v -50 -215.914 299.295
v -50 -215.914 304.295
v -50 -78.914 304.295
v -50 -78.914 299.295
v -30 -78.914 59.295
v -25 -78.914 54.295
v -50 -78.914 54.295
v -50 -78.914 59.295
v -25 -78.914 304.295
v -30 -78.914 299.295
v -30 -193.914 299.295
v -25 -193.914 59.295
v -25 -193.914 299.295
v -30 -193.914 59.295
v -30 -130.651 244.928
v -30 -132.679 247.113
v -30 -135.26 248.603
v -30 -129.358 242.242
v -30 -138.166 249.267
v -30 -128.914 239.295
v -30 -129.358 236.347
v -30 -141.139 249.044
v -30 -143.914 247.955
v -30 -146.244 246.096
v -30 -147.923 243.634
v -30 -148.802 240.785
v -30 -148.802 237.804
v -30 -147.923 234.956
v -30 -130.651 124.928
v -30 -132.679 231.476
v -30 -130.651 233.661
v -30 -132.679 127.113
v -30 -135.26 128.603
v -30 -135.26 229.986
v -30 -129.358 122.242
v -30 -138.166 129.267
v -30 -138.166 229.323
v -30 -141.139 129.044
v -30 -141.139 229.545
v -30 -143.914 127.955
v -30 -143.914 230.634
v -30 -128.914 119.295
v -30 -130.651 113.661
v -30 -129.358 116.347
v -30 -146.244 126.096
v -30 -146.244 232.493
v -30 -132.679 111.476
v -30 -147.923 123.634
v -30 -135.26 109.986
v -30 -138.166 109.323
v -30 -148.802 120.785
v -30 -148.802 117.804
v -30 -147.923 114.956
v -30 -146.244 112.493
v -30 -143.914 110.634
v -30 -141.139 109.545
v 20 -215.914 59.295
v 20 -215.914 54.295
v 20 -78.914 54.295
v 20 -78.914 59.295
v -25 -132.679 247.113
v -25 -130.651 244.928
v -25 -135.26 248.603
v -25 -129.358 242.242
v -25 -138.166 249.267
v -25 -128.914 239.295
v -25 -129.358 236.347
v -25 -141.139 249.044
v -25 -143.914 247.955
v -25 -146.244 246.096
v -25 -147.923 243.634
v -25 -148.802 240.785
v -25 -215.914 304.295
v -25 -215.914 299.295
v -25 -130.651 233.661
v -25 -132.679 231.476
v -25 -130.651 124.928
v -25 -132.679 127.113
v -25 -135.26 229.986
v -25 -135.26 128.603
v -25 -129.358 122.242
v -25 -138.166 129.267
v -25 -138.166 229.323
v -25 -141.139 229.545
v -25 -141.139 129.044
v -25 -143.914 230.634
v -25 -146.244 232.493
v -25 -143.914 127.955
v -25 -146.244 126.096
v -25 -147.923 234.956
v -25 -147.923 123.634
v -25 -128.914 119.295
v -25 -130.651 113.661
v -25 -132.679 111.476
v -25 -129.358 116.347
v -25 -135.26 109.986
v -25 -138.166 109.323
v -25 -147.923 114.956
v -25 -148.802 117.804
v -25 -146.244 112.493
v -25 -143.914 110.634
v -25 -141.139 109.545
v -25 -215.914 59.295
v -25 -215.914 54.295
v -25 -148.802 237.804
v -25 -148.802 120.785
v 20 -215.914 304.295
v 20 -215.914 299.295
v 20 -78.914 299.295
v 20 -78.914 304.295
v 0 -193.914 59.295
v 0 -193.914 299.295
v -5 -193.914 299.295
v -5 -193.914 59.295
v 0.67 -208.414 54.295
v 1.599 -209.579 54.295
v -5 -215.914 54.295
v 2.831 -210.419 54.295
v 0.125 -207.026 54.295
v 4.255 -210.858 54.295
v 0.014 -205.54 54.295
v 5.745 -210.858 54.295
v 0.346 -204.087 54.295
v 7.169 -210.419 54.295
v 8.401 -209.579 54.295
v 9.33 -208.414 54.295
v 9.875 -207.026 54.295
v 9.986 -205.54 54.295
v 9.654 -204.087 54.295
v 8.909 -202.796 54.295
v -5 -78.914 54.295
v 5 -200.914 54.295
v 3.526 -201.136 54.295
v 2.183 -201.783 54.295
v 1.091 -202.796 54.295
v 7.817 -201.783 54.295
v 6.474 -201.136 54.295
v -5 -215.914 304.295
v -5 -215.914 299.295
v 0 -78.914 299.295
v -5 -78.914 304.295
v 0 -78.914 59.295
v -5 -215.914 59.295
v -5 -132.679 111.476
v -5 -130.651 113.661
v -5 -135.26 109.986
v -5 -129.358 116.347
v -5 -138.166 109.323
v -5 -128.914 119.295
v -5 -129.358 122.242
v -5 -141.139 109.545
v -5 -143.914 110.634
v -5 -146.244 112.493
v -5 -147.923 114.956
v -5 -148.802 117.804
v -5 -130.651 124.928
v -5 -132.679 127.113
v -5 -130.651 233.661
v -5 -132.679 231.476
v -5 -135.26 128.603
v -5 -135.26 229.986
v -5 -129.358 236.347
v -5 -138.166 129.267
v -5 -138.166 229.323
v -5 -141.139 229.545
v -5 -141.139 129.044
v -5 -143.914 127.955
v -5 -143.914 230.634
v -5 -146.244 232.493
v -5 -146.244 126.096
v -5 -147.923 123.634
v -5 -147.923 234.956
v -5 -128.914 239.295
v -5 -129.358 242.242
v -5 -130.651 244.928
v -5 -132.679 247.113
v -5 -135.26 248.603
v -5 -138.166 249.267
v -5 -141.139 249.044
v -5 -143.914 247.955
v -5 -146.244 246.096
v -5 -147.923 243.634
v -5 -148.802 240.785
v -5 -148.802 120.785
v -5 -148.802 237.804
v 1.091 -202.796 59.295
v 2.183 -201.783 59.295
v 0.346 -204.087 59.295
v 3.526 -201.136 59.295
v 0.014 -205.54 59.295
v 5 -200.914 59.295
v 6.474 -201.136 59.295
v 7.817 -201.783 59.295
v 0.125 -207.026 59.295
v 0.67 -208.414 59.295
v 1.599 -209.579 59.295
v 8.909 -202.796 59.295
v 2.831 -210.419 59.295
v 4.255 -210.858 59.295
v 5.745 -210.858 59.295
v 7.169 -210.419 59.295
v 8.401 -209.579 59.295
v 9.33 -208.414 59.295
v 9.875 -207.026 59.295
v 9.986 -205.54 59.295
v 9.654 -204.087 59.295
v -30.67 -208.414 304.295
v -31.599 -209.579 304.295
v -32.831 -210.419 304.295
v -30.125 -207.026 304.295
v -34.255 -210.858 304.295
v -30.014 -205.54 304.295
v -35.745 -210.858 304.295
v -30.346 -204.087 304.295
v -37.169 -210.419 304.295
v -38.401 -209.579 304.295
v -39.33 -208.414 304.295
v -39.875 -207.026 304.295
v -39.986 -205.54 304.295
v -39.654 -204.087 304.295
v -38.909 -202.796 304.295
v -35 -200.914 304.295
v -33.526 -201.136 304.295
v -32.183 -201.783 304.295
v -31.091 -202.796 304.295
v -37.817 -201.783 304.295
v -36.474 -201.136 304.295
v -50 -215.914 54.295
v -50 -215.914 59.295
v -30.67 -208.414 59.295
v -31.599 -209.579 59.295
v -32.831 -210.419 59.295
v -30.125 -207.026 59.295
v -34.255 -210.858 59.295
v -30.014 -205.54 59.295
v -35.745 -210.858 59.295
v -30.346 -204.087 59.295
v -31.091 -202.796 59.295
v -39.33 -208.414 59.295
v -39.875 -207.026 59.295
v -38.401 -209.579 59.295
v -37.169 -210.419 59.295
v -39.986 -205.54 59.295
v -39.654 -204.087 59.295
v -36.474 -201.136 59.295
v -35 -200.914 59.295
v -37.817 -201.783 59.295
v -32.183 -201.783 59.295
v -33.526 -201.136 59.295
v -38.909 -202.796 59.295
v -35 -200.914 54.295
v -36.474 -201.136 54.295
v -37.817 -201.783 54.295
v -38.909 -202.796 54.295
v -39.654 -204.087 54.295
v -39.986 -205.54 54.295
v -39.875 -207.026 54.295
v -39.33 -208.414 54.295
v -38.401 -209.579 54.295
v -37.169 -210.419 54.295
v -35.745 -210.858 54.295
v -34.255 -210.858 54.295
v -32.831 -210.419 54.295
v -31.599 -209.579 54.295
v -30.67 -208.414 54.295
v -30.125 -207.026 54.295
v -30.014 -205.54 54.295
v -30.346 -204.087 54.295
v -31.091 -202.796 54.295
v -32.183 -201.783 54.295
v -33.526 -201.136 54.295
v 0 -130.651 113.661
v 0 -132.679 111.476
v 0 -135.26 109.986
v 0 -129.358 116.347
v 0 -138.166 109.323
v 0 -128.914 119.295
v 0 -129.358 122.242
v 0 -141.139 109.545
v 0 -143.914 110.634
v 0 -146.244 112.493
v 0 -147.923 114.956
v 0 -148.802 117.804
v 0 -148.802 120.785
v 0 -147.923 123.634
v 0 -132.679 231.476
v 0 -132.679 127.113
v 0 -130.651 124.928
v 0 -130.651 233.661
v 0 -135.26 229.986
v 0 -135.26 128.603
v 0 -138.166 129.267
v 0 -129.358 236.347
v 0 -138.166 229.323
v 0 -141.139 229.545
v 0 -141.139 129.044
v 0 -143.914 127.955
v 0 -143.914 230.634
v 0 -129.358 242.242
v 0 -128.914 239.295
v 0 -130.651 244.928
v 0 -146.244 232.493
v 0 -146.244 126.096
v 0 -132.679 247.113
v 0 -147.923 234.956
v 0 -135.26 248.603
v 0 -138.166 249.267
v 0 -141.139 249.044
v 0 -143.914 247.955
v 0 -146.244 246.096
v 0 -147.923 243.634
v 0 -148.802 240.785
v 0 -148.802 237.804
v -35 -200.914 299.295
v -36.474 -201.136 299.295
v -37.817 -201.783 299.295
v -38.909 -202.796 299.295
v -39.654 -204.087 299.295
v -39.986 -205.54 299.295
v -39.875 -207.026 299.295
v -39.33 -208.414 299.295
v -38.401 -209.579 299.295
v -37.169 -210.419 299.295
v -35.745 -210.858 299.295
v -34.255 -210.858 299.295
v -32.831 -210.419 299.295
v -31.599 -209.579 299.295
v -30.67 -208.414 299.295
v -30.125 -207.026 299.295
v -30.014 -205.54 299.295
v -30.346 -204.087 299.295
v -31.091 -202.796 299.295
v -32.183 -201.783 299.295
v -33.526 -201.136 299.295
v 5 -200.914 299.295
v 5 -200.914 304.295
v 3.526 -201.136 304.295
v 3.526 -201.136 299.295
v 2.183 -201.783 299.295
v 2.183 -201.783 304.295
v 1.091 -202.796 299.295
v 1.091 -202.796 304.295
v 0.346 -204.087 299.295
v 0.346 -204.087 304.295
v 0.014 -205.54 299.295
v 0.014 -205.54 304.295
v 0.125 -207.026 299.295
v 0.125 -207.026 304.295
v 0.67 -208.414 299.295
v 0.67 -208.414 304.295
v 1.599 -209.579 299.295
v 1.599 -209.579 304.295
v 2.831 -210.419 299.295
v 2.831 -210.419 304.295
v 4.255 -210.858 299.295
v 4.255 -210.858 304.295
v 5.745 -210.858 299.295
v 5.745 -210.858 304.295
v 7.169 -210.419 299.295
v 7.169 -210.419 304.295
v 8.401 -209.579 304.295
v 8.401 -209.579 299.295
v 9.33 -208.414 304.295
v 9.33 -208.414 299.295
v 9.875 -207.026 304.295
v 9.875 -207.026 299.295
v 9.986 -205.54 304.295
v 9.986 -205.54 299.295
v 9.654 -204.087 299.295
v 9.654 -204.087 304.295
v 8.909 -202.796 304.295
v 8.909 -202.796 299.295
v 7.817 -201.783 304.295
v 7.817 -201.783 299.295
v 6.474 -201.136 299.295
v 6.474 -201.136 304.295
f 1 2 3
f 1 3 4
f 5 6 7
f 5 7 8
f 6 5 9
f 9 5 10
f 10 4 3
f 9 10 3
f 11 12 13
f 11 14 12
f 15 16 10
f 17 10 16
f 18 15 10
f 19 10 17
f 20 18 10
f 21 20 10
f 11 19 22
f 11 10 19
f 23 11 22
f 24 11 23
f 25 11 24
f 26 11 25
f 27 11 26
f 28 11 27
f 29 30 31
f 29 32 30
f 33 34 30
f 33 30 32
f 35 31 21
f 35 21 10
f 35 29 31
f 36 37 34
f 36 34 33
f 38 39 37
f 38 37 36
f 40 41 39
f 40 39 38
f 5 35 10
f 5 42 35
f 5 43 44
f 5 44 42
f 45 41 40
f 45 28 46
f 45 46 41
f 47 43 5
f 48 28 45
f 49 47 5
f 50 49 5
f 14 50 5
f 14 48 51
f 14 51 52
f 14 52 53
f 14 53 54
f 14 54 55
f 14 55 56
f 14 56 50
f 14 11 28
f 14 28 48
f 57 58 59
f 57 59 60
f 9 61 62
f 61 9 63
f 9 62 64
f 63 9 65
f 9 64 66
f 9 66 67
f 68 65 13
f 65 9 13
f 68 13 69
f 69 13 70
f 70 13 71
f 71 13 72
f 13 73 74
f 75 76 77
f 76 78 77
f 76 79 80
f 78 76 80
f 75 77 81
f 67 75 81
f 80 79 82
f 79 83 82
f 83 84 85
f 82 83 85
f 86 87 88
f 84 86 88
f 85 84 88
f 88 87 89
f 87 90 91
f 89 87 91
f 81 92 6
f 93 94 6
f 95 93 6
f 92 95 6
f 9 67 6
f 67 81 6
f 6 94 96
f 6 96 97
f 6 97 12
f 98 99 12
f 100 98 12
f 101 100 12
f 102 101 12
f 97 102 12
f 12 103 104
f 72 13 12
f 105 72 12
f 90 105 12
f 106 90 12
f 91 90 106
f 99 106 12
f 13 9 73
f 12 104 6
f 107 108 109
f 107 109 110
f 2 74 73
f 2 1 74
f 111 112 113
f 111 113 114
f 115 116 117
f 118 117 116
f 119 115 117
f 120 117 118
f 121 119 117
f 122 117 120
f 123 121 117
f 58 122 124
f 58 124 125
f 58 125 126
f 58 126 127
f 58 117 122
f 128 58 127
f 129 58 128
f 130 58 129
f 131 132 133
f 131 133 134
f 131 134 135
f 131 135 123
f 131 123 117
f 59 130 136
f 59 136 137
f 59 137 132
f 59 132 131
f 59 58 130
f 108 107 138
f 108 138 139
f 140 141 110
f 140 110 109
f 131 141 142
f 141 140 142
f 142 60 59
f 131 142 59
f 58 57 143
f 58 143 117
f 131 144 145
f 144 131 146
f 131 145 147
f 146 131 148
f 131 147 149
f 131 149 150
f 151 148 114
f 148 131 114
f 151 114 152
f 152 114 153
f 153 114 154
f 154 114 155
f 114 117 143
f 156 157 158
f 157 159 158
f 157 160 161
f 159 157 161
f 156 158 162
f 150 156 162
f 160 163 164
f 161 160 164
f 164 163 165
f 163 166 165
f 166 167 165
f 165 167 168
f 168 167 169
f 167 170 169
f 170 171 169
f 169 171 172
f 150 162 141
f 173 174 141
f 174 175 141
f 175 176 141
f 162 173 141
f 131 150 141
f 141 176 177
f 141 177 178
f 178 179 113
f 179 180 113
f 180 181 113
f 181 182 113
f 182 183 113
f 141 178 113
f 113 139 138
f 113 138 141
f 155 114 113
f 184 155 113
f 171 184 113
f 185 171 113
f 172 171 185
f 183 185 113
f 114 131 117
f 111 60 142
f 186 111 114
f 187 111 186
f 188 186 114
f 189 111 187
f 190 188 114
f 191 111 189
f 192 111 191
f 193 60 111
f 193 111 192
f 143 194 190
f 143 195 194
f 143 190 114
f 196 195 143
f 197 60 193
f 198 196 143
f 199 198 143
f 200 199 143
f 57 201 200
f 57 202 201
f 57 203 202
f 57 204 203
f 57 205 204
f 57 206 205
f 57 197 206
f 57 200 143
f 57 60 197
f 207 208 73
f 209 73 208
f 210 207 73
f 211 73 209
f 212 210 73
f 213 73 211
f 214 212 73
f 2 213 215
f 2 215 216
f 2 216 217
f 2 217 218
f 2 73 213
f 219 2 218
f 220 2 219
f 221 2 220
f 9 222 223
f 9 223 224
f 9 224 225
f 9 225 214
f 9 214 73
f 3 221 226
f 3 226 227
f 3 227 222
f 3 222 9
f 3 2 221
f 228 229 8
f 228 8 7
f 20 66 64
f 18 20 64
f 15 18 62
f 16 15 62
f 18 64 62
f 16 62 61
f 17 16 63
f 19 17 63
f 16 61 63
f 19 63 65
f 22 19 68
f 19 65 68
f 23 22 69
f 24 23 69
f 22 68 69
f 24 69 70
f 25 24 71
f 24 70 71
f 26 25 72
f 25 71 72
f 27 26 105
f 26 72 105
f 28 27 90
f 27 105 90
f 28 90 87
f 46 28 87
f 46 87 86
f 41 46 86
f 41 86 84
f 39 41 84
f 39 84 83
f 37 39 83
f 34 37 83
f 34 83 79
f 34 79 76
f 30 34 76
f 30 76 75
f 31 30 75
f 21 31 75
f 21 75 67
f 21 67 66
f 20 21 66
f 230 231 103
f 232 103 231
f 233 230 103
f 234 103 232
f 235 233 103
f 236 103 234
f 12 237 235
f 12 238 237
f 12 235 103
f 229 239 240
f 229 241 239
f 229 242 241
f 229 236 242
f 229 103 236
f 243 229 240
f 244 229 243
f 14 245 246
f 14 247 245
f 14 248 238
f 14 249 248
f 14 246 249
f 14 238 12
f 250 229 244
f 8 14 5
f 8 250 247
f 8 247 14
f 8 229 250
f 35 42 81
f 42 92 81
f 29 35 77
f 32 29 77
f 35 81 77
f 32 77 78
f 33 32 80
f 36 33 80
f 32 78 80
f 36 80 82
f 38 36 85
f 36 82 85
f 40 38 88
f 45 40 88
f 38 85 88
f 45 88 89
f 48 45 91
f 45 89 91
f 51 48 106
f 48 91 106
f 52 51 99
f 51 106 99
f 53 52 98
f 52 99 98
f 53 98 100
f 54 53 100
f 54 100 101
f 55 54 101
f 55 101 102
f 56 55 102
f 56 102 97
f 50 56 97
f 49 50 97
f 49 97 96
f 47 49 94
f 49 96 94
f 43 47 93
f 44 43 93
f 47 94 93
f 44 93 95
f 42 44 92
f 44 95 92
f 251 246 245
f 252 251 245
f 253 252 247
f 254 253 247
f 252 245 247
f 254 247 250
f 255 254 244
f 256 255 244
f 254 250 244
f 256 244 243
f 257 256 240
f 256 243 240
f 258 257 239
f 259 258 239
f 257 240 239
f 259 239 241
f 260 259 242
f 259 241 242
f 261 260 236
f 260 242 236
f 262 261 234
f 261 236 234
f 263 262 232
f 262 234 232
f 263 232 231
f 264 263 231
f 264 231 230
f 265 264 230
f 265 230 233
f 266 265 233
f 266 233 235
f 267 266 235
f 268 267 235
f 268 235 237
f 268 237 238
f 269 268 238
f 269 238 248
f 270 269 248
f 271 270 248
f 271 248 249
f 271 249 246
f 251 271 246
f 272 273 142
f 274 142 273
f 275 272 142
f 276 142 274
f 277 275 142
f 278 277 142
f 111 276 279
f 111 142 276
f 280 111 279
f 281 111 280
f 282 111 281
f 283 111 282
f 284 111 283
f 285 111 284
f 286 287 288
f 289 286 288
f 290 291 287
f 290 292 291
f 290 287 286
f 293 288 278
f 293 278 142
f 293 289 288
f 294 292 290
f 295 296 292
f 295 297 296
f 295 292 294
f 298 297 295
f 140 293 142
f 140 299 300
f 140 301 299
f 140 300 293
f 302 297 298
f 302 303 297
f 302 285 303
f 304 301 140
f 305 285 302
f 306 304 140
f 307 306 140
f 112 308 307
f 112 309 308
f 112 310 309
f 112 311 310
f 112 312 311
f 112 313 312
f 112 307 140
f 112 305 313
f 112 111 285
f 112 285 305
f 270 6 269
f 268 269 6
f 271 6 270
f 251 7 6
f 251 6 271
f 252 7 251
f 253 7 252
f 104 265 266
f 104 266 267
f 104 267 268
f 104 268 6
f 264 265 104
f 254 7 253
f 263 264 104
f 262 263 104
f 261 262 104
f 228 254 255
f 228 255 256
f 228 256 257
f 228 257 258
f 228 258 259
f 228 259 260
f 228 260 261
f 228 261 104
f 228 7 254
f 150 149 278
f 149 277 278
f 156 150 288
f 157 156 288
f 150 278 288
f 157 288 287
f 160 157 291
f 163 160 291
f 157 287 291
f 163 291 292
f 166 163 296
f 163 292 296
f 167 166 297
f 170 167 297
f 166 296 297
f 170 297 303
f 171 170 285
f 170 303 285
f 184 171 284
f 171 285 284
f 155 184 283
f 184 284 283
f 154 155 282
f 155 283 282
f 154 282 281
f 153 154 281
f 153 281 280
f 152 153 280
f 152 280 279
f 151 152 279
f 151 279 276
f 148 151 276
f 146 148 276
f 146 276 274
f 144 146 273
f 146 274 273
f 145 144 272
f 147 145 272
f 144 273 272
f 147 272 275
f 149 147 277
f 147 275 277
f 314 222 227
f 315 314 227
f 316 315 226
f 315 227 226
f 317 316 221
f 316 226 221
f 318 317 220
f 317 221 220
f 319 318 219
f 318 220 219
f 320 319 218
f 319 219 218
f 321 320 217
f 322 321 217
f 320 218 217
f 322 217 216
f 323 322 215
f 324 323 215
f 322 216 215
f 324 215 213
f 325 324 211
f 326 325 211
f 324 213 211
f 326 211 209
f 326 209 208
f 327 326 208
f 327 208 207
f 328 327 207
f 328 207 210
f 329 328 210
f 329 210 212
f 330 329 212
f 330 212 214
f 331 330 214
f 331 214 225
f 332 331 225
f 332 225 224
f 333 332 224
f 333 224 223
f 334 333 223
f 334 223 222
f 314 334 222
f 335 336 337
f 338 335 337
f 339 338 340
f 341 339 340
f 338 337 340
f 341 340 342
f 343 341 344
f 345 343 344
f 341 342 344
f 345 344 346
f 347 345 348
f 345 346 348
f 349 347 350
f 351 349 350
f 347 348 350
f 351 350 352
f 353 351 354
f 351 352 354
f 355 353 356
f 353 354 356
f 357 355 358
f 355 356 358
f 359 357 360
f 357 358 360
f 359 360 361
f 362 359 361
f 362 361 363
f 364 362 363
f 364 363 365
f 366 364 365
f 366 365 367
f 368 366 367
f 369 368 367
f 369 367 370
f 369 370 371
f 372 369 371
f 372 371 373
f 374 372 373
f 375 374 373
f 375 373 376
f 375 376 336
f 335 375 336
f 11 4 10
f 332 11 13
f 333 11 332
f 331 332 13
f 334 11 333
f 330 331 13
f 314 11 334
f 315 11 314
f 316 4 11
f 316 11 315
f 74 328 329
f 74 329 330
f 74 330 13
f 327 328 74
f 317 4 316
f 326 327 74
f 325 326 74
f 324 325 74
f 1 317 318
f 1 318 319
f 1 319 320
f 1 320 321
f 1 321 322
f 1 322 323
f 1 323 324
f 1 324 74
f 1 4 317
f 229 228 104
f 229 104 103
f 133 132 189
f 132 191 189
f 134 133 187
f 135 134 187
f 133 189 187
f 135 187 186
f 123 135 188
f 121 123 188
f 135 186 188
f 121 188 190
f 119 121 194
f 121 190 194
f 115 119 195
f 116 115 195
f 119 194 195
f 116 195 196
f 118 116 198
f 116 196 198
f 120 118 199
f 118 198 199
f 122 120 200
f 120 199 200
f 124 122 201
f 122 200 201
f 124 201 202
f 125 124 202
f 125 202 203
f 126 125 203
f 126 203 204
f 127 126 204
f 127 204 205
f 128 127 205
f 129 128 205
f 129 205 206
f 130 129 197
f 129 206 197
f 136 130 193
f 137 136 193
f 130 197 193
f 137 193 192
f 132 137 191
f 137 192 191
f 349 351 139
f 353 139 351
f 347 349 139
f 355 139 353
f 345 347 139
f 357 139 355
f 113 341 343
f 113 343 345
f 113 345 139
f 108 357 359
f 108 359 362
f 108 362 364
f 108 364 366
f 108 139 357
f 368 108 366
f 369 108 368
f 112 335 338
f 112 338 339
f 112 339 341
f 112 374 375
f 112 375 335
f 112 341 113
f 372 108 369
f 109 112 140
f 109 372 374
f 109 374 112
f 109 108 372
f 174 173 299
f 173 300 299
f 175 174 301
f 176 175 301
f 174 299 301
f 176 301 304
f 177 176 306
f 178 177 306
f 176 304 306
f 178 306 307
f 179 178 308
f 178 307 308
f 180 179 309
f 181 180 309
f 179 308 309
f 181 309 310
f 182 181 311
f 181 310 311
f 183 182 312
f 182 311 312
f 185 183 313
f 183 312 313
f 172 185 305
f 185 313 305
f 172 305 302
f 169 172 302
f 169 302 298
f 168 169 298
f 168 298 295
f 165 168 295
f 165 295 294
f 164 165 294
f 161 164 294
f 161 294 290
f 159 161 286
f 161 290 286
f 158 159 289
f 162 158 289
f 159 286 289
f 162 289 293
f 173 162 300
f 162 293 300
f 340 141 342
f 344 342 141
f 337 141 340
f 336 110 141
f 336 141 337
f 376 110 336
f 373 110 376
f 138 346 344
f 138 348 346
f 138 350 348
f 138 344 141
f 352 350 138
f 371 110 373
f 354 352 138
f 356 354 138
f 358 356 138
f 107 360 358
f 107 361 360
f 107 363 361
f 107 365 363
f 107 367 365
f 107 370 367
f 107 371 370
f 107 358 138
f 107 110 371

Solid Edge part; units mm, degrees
extrude "Protrusion1" [suppressed]
sketch "Sketch1" plane through (0, 0, 0) normal (1, 0, 0) x (0, 1, 0)
  line L0 (-193.9137, 54.2947) -> (-78.9137, 54.2947)
  line L1 (-78.9137, 304.2947) -> (-78.9137, 54.2947)
  line L2 (-78.9137, 304.2947) -> (-193.9137, 304.2947)
  line L3 (-193.9137, 304.2947) -> (-193.9137, 54.2947)
  dimension "D1" = 250
  dimension "D2" = 115
extrude "ExtrudedProtrusion_2" add sketch "Sketch1" against normal blind 5
sketch "Sketch2" plane through (20, -159.7644, 213.9203) normal (1, 0, 0) x (0, 1, 0)
  line L0 (-56.1493, -159.6256) -> (80.8507, -159.6256)
  line L1 (80.8507, -159.6256) -> (80.8507, -154.6256)
  line L2 (80.8507, -154.6256) -> (-56.1493, -154.6256)
  line L3 (-56.1493, -154.6256) -> (-56.1493, -159.6256)
  line L4 (-56.1493, 85.3744) -> (80.8507, 85.3744)
  line L5 (80.8507, 85.3744) -> (80.8507, 90.3744)
  line L6 (80.8507, 90.3744) -> (-56.1493, 90.3744)
  line L7 (-56.1493, 90.3744) -> (-56.1493, 85.3744)
  dimension "D1" = 5
  dimension "D2" = 137
  dimension "D3" = 5
  dimension "D4" = 22
  dimension "D5" = 22
  dimension "D6" = 137
extrude "ExtrudedProtrusion_4" add sketch "Sketch2" against normal blind 25
sketch "Sketch3" plane through (-35, -124.7644, 304.2947) normal (0, 0, 1) x (0, 1, 0)
  circle A0 centre (-81.1493, -40) radius 5
  dimension "D1" = 10
  dimension "D2" = 10
extrude "Cutout1" cut sketch "Sketch3" against normal through all
mirror "Mirror1" about plane through (-15, -224.7644, 368.5458) normal (-1, 0, 0) of "ExtrudedProtrusion_2", "ExtrudedProtrusion_4", "Cutout1"
sketch "Sketch4" plane through (0, -136.4137, 179.2947) normal (1, 0, 0) x (0, 1, 0)
  circle A0 centre (-2.5, 60) radius 10
  circle A1 centre (-2.5, -60) radius 10
  dimension "D1" = 20
  dimension "D2" = 60
  dimension "D3" = 60
  dimension "D4" = 20
  dimension "D5" = 60
  dimension "D6" = 120
extrude "Cutout3" cut sketch "Sketch4" against normal through all
